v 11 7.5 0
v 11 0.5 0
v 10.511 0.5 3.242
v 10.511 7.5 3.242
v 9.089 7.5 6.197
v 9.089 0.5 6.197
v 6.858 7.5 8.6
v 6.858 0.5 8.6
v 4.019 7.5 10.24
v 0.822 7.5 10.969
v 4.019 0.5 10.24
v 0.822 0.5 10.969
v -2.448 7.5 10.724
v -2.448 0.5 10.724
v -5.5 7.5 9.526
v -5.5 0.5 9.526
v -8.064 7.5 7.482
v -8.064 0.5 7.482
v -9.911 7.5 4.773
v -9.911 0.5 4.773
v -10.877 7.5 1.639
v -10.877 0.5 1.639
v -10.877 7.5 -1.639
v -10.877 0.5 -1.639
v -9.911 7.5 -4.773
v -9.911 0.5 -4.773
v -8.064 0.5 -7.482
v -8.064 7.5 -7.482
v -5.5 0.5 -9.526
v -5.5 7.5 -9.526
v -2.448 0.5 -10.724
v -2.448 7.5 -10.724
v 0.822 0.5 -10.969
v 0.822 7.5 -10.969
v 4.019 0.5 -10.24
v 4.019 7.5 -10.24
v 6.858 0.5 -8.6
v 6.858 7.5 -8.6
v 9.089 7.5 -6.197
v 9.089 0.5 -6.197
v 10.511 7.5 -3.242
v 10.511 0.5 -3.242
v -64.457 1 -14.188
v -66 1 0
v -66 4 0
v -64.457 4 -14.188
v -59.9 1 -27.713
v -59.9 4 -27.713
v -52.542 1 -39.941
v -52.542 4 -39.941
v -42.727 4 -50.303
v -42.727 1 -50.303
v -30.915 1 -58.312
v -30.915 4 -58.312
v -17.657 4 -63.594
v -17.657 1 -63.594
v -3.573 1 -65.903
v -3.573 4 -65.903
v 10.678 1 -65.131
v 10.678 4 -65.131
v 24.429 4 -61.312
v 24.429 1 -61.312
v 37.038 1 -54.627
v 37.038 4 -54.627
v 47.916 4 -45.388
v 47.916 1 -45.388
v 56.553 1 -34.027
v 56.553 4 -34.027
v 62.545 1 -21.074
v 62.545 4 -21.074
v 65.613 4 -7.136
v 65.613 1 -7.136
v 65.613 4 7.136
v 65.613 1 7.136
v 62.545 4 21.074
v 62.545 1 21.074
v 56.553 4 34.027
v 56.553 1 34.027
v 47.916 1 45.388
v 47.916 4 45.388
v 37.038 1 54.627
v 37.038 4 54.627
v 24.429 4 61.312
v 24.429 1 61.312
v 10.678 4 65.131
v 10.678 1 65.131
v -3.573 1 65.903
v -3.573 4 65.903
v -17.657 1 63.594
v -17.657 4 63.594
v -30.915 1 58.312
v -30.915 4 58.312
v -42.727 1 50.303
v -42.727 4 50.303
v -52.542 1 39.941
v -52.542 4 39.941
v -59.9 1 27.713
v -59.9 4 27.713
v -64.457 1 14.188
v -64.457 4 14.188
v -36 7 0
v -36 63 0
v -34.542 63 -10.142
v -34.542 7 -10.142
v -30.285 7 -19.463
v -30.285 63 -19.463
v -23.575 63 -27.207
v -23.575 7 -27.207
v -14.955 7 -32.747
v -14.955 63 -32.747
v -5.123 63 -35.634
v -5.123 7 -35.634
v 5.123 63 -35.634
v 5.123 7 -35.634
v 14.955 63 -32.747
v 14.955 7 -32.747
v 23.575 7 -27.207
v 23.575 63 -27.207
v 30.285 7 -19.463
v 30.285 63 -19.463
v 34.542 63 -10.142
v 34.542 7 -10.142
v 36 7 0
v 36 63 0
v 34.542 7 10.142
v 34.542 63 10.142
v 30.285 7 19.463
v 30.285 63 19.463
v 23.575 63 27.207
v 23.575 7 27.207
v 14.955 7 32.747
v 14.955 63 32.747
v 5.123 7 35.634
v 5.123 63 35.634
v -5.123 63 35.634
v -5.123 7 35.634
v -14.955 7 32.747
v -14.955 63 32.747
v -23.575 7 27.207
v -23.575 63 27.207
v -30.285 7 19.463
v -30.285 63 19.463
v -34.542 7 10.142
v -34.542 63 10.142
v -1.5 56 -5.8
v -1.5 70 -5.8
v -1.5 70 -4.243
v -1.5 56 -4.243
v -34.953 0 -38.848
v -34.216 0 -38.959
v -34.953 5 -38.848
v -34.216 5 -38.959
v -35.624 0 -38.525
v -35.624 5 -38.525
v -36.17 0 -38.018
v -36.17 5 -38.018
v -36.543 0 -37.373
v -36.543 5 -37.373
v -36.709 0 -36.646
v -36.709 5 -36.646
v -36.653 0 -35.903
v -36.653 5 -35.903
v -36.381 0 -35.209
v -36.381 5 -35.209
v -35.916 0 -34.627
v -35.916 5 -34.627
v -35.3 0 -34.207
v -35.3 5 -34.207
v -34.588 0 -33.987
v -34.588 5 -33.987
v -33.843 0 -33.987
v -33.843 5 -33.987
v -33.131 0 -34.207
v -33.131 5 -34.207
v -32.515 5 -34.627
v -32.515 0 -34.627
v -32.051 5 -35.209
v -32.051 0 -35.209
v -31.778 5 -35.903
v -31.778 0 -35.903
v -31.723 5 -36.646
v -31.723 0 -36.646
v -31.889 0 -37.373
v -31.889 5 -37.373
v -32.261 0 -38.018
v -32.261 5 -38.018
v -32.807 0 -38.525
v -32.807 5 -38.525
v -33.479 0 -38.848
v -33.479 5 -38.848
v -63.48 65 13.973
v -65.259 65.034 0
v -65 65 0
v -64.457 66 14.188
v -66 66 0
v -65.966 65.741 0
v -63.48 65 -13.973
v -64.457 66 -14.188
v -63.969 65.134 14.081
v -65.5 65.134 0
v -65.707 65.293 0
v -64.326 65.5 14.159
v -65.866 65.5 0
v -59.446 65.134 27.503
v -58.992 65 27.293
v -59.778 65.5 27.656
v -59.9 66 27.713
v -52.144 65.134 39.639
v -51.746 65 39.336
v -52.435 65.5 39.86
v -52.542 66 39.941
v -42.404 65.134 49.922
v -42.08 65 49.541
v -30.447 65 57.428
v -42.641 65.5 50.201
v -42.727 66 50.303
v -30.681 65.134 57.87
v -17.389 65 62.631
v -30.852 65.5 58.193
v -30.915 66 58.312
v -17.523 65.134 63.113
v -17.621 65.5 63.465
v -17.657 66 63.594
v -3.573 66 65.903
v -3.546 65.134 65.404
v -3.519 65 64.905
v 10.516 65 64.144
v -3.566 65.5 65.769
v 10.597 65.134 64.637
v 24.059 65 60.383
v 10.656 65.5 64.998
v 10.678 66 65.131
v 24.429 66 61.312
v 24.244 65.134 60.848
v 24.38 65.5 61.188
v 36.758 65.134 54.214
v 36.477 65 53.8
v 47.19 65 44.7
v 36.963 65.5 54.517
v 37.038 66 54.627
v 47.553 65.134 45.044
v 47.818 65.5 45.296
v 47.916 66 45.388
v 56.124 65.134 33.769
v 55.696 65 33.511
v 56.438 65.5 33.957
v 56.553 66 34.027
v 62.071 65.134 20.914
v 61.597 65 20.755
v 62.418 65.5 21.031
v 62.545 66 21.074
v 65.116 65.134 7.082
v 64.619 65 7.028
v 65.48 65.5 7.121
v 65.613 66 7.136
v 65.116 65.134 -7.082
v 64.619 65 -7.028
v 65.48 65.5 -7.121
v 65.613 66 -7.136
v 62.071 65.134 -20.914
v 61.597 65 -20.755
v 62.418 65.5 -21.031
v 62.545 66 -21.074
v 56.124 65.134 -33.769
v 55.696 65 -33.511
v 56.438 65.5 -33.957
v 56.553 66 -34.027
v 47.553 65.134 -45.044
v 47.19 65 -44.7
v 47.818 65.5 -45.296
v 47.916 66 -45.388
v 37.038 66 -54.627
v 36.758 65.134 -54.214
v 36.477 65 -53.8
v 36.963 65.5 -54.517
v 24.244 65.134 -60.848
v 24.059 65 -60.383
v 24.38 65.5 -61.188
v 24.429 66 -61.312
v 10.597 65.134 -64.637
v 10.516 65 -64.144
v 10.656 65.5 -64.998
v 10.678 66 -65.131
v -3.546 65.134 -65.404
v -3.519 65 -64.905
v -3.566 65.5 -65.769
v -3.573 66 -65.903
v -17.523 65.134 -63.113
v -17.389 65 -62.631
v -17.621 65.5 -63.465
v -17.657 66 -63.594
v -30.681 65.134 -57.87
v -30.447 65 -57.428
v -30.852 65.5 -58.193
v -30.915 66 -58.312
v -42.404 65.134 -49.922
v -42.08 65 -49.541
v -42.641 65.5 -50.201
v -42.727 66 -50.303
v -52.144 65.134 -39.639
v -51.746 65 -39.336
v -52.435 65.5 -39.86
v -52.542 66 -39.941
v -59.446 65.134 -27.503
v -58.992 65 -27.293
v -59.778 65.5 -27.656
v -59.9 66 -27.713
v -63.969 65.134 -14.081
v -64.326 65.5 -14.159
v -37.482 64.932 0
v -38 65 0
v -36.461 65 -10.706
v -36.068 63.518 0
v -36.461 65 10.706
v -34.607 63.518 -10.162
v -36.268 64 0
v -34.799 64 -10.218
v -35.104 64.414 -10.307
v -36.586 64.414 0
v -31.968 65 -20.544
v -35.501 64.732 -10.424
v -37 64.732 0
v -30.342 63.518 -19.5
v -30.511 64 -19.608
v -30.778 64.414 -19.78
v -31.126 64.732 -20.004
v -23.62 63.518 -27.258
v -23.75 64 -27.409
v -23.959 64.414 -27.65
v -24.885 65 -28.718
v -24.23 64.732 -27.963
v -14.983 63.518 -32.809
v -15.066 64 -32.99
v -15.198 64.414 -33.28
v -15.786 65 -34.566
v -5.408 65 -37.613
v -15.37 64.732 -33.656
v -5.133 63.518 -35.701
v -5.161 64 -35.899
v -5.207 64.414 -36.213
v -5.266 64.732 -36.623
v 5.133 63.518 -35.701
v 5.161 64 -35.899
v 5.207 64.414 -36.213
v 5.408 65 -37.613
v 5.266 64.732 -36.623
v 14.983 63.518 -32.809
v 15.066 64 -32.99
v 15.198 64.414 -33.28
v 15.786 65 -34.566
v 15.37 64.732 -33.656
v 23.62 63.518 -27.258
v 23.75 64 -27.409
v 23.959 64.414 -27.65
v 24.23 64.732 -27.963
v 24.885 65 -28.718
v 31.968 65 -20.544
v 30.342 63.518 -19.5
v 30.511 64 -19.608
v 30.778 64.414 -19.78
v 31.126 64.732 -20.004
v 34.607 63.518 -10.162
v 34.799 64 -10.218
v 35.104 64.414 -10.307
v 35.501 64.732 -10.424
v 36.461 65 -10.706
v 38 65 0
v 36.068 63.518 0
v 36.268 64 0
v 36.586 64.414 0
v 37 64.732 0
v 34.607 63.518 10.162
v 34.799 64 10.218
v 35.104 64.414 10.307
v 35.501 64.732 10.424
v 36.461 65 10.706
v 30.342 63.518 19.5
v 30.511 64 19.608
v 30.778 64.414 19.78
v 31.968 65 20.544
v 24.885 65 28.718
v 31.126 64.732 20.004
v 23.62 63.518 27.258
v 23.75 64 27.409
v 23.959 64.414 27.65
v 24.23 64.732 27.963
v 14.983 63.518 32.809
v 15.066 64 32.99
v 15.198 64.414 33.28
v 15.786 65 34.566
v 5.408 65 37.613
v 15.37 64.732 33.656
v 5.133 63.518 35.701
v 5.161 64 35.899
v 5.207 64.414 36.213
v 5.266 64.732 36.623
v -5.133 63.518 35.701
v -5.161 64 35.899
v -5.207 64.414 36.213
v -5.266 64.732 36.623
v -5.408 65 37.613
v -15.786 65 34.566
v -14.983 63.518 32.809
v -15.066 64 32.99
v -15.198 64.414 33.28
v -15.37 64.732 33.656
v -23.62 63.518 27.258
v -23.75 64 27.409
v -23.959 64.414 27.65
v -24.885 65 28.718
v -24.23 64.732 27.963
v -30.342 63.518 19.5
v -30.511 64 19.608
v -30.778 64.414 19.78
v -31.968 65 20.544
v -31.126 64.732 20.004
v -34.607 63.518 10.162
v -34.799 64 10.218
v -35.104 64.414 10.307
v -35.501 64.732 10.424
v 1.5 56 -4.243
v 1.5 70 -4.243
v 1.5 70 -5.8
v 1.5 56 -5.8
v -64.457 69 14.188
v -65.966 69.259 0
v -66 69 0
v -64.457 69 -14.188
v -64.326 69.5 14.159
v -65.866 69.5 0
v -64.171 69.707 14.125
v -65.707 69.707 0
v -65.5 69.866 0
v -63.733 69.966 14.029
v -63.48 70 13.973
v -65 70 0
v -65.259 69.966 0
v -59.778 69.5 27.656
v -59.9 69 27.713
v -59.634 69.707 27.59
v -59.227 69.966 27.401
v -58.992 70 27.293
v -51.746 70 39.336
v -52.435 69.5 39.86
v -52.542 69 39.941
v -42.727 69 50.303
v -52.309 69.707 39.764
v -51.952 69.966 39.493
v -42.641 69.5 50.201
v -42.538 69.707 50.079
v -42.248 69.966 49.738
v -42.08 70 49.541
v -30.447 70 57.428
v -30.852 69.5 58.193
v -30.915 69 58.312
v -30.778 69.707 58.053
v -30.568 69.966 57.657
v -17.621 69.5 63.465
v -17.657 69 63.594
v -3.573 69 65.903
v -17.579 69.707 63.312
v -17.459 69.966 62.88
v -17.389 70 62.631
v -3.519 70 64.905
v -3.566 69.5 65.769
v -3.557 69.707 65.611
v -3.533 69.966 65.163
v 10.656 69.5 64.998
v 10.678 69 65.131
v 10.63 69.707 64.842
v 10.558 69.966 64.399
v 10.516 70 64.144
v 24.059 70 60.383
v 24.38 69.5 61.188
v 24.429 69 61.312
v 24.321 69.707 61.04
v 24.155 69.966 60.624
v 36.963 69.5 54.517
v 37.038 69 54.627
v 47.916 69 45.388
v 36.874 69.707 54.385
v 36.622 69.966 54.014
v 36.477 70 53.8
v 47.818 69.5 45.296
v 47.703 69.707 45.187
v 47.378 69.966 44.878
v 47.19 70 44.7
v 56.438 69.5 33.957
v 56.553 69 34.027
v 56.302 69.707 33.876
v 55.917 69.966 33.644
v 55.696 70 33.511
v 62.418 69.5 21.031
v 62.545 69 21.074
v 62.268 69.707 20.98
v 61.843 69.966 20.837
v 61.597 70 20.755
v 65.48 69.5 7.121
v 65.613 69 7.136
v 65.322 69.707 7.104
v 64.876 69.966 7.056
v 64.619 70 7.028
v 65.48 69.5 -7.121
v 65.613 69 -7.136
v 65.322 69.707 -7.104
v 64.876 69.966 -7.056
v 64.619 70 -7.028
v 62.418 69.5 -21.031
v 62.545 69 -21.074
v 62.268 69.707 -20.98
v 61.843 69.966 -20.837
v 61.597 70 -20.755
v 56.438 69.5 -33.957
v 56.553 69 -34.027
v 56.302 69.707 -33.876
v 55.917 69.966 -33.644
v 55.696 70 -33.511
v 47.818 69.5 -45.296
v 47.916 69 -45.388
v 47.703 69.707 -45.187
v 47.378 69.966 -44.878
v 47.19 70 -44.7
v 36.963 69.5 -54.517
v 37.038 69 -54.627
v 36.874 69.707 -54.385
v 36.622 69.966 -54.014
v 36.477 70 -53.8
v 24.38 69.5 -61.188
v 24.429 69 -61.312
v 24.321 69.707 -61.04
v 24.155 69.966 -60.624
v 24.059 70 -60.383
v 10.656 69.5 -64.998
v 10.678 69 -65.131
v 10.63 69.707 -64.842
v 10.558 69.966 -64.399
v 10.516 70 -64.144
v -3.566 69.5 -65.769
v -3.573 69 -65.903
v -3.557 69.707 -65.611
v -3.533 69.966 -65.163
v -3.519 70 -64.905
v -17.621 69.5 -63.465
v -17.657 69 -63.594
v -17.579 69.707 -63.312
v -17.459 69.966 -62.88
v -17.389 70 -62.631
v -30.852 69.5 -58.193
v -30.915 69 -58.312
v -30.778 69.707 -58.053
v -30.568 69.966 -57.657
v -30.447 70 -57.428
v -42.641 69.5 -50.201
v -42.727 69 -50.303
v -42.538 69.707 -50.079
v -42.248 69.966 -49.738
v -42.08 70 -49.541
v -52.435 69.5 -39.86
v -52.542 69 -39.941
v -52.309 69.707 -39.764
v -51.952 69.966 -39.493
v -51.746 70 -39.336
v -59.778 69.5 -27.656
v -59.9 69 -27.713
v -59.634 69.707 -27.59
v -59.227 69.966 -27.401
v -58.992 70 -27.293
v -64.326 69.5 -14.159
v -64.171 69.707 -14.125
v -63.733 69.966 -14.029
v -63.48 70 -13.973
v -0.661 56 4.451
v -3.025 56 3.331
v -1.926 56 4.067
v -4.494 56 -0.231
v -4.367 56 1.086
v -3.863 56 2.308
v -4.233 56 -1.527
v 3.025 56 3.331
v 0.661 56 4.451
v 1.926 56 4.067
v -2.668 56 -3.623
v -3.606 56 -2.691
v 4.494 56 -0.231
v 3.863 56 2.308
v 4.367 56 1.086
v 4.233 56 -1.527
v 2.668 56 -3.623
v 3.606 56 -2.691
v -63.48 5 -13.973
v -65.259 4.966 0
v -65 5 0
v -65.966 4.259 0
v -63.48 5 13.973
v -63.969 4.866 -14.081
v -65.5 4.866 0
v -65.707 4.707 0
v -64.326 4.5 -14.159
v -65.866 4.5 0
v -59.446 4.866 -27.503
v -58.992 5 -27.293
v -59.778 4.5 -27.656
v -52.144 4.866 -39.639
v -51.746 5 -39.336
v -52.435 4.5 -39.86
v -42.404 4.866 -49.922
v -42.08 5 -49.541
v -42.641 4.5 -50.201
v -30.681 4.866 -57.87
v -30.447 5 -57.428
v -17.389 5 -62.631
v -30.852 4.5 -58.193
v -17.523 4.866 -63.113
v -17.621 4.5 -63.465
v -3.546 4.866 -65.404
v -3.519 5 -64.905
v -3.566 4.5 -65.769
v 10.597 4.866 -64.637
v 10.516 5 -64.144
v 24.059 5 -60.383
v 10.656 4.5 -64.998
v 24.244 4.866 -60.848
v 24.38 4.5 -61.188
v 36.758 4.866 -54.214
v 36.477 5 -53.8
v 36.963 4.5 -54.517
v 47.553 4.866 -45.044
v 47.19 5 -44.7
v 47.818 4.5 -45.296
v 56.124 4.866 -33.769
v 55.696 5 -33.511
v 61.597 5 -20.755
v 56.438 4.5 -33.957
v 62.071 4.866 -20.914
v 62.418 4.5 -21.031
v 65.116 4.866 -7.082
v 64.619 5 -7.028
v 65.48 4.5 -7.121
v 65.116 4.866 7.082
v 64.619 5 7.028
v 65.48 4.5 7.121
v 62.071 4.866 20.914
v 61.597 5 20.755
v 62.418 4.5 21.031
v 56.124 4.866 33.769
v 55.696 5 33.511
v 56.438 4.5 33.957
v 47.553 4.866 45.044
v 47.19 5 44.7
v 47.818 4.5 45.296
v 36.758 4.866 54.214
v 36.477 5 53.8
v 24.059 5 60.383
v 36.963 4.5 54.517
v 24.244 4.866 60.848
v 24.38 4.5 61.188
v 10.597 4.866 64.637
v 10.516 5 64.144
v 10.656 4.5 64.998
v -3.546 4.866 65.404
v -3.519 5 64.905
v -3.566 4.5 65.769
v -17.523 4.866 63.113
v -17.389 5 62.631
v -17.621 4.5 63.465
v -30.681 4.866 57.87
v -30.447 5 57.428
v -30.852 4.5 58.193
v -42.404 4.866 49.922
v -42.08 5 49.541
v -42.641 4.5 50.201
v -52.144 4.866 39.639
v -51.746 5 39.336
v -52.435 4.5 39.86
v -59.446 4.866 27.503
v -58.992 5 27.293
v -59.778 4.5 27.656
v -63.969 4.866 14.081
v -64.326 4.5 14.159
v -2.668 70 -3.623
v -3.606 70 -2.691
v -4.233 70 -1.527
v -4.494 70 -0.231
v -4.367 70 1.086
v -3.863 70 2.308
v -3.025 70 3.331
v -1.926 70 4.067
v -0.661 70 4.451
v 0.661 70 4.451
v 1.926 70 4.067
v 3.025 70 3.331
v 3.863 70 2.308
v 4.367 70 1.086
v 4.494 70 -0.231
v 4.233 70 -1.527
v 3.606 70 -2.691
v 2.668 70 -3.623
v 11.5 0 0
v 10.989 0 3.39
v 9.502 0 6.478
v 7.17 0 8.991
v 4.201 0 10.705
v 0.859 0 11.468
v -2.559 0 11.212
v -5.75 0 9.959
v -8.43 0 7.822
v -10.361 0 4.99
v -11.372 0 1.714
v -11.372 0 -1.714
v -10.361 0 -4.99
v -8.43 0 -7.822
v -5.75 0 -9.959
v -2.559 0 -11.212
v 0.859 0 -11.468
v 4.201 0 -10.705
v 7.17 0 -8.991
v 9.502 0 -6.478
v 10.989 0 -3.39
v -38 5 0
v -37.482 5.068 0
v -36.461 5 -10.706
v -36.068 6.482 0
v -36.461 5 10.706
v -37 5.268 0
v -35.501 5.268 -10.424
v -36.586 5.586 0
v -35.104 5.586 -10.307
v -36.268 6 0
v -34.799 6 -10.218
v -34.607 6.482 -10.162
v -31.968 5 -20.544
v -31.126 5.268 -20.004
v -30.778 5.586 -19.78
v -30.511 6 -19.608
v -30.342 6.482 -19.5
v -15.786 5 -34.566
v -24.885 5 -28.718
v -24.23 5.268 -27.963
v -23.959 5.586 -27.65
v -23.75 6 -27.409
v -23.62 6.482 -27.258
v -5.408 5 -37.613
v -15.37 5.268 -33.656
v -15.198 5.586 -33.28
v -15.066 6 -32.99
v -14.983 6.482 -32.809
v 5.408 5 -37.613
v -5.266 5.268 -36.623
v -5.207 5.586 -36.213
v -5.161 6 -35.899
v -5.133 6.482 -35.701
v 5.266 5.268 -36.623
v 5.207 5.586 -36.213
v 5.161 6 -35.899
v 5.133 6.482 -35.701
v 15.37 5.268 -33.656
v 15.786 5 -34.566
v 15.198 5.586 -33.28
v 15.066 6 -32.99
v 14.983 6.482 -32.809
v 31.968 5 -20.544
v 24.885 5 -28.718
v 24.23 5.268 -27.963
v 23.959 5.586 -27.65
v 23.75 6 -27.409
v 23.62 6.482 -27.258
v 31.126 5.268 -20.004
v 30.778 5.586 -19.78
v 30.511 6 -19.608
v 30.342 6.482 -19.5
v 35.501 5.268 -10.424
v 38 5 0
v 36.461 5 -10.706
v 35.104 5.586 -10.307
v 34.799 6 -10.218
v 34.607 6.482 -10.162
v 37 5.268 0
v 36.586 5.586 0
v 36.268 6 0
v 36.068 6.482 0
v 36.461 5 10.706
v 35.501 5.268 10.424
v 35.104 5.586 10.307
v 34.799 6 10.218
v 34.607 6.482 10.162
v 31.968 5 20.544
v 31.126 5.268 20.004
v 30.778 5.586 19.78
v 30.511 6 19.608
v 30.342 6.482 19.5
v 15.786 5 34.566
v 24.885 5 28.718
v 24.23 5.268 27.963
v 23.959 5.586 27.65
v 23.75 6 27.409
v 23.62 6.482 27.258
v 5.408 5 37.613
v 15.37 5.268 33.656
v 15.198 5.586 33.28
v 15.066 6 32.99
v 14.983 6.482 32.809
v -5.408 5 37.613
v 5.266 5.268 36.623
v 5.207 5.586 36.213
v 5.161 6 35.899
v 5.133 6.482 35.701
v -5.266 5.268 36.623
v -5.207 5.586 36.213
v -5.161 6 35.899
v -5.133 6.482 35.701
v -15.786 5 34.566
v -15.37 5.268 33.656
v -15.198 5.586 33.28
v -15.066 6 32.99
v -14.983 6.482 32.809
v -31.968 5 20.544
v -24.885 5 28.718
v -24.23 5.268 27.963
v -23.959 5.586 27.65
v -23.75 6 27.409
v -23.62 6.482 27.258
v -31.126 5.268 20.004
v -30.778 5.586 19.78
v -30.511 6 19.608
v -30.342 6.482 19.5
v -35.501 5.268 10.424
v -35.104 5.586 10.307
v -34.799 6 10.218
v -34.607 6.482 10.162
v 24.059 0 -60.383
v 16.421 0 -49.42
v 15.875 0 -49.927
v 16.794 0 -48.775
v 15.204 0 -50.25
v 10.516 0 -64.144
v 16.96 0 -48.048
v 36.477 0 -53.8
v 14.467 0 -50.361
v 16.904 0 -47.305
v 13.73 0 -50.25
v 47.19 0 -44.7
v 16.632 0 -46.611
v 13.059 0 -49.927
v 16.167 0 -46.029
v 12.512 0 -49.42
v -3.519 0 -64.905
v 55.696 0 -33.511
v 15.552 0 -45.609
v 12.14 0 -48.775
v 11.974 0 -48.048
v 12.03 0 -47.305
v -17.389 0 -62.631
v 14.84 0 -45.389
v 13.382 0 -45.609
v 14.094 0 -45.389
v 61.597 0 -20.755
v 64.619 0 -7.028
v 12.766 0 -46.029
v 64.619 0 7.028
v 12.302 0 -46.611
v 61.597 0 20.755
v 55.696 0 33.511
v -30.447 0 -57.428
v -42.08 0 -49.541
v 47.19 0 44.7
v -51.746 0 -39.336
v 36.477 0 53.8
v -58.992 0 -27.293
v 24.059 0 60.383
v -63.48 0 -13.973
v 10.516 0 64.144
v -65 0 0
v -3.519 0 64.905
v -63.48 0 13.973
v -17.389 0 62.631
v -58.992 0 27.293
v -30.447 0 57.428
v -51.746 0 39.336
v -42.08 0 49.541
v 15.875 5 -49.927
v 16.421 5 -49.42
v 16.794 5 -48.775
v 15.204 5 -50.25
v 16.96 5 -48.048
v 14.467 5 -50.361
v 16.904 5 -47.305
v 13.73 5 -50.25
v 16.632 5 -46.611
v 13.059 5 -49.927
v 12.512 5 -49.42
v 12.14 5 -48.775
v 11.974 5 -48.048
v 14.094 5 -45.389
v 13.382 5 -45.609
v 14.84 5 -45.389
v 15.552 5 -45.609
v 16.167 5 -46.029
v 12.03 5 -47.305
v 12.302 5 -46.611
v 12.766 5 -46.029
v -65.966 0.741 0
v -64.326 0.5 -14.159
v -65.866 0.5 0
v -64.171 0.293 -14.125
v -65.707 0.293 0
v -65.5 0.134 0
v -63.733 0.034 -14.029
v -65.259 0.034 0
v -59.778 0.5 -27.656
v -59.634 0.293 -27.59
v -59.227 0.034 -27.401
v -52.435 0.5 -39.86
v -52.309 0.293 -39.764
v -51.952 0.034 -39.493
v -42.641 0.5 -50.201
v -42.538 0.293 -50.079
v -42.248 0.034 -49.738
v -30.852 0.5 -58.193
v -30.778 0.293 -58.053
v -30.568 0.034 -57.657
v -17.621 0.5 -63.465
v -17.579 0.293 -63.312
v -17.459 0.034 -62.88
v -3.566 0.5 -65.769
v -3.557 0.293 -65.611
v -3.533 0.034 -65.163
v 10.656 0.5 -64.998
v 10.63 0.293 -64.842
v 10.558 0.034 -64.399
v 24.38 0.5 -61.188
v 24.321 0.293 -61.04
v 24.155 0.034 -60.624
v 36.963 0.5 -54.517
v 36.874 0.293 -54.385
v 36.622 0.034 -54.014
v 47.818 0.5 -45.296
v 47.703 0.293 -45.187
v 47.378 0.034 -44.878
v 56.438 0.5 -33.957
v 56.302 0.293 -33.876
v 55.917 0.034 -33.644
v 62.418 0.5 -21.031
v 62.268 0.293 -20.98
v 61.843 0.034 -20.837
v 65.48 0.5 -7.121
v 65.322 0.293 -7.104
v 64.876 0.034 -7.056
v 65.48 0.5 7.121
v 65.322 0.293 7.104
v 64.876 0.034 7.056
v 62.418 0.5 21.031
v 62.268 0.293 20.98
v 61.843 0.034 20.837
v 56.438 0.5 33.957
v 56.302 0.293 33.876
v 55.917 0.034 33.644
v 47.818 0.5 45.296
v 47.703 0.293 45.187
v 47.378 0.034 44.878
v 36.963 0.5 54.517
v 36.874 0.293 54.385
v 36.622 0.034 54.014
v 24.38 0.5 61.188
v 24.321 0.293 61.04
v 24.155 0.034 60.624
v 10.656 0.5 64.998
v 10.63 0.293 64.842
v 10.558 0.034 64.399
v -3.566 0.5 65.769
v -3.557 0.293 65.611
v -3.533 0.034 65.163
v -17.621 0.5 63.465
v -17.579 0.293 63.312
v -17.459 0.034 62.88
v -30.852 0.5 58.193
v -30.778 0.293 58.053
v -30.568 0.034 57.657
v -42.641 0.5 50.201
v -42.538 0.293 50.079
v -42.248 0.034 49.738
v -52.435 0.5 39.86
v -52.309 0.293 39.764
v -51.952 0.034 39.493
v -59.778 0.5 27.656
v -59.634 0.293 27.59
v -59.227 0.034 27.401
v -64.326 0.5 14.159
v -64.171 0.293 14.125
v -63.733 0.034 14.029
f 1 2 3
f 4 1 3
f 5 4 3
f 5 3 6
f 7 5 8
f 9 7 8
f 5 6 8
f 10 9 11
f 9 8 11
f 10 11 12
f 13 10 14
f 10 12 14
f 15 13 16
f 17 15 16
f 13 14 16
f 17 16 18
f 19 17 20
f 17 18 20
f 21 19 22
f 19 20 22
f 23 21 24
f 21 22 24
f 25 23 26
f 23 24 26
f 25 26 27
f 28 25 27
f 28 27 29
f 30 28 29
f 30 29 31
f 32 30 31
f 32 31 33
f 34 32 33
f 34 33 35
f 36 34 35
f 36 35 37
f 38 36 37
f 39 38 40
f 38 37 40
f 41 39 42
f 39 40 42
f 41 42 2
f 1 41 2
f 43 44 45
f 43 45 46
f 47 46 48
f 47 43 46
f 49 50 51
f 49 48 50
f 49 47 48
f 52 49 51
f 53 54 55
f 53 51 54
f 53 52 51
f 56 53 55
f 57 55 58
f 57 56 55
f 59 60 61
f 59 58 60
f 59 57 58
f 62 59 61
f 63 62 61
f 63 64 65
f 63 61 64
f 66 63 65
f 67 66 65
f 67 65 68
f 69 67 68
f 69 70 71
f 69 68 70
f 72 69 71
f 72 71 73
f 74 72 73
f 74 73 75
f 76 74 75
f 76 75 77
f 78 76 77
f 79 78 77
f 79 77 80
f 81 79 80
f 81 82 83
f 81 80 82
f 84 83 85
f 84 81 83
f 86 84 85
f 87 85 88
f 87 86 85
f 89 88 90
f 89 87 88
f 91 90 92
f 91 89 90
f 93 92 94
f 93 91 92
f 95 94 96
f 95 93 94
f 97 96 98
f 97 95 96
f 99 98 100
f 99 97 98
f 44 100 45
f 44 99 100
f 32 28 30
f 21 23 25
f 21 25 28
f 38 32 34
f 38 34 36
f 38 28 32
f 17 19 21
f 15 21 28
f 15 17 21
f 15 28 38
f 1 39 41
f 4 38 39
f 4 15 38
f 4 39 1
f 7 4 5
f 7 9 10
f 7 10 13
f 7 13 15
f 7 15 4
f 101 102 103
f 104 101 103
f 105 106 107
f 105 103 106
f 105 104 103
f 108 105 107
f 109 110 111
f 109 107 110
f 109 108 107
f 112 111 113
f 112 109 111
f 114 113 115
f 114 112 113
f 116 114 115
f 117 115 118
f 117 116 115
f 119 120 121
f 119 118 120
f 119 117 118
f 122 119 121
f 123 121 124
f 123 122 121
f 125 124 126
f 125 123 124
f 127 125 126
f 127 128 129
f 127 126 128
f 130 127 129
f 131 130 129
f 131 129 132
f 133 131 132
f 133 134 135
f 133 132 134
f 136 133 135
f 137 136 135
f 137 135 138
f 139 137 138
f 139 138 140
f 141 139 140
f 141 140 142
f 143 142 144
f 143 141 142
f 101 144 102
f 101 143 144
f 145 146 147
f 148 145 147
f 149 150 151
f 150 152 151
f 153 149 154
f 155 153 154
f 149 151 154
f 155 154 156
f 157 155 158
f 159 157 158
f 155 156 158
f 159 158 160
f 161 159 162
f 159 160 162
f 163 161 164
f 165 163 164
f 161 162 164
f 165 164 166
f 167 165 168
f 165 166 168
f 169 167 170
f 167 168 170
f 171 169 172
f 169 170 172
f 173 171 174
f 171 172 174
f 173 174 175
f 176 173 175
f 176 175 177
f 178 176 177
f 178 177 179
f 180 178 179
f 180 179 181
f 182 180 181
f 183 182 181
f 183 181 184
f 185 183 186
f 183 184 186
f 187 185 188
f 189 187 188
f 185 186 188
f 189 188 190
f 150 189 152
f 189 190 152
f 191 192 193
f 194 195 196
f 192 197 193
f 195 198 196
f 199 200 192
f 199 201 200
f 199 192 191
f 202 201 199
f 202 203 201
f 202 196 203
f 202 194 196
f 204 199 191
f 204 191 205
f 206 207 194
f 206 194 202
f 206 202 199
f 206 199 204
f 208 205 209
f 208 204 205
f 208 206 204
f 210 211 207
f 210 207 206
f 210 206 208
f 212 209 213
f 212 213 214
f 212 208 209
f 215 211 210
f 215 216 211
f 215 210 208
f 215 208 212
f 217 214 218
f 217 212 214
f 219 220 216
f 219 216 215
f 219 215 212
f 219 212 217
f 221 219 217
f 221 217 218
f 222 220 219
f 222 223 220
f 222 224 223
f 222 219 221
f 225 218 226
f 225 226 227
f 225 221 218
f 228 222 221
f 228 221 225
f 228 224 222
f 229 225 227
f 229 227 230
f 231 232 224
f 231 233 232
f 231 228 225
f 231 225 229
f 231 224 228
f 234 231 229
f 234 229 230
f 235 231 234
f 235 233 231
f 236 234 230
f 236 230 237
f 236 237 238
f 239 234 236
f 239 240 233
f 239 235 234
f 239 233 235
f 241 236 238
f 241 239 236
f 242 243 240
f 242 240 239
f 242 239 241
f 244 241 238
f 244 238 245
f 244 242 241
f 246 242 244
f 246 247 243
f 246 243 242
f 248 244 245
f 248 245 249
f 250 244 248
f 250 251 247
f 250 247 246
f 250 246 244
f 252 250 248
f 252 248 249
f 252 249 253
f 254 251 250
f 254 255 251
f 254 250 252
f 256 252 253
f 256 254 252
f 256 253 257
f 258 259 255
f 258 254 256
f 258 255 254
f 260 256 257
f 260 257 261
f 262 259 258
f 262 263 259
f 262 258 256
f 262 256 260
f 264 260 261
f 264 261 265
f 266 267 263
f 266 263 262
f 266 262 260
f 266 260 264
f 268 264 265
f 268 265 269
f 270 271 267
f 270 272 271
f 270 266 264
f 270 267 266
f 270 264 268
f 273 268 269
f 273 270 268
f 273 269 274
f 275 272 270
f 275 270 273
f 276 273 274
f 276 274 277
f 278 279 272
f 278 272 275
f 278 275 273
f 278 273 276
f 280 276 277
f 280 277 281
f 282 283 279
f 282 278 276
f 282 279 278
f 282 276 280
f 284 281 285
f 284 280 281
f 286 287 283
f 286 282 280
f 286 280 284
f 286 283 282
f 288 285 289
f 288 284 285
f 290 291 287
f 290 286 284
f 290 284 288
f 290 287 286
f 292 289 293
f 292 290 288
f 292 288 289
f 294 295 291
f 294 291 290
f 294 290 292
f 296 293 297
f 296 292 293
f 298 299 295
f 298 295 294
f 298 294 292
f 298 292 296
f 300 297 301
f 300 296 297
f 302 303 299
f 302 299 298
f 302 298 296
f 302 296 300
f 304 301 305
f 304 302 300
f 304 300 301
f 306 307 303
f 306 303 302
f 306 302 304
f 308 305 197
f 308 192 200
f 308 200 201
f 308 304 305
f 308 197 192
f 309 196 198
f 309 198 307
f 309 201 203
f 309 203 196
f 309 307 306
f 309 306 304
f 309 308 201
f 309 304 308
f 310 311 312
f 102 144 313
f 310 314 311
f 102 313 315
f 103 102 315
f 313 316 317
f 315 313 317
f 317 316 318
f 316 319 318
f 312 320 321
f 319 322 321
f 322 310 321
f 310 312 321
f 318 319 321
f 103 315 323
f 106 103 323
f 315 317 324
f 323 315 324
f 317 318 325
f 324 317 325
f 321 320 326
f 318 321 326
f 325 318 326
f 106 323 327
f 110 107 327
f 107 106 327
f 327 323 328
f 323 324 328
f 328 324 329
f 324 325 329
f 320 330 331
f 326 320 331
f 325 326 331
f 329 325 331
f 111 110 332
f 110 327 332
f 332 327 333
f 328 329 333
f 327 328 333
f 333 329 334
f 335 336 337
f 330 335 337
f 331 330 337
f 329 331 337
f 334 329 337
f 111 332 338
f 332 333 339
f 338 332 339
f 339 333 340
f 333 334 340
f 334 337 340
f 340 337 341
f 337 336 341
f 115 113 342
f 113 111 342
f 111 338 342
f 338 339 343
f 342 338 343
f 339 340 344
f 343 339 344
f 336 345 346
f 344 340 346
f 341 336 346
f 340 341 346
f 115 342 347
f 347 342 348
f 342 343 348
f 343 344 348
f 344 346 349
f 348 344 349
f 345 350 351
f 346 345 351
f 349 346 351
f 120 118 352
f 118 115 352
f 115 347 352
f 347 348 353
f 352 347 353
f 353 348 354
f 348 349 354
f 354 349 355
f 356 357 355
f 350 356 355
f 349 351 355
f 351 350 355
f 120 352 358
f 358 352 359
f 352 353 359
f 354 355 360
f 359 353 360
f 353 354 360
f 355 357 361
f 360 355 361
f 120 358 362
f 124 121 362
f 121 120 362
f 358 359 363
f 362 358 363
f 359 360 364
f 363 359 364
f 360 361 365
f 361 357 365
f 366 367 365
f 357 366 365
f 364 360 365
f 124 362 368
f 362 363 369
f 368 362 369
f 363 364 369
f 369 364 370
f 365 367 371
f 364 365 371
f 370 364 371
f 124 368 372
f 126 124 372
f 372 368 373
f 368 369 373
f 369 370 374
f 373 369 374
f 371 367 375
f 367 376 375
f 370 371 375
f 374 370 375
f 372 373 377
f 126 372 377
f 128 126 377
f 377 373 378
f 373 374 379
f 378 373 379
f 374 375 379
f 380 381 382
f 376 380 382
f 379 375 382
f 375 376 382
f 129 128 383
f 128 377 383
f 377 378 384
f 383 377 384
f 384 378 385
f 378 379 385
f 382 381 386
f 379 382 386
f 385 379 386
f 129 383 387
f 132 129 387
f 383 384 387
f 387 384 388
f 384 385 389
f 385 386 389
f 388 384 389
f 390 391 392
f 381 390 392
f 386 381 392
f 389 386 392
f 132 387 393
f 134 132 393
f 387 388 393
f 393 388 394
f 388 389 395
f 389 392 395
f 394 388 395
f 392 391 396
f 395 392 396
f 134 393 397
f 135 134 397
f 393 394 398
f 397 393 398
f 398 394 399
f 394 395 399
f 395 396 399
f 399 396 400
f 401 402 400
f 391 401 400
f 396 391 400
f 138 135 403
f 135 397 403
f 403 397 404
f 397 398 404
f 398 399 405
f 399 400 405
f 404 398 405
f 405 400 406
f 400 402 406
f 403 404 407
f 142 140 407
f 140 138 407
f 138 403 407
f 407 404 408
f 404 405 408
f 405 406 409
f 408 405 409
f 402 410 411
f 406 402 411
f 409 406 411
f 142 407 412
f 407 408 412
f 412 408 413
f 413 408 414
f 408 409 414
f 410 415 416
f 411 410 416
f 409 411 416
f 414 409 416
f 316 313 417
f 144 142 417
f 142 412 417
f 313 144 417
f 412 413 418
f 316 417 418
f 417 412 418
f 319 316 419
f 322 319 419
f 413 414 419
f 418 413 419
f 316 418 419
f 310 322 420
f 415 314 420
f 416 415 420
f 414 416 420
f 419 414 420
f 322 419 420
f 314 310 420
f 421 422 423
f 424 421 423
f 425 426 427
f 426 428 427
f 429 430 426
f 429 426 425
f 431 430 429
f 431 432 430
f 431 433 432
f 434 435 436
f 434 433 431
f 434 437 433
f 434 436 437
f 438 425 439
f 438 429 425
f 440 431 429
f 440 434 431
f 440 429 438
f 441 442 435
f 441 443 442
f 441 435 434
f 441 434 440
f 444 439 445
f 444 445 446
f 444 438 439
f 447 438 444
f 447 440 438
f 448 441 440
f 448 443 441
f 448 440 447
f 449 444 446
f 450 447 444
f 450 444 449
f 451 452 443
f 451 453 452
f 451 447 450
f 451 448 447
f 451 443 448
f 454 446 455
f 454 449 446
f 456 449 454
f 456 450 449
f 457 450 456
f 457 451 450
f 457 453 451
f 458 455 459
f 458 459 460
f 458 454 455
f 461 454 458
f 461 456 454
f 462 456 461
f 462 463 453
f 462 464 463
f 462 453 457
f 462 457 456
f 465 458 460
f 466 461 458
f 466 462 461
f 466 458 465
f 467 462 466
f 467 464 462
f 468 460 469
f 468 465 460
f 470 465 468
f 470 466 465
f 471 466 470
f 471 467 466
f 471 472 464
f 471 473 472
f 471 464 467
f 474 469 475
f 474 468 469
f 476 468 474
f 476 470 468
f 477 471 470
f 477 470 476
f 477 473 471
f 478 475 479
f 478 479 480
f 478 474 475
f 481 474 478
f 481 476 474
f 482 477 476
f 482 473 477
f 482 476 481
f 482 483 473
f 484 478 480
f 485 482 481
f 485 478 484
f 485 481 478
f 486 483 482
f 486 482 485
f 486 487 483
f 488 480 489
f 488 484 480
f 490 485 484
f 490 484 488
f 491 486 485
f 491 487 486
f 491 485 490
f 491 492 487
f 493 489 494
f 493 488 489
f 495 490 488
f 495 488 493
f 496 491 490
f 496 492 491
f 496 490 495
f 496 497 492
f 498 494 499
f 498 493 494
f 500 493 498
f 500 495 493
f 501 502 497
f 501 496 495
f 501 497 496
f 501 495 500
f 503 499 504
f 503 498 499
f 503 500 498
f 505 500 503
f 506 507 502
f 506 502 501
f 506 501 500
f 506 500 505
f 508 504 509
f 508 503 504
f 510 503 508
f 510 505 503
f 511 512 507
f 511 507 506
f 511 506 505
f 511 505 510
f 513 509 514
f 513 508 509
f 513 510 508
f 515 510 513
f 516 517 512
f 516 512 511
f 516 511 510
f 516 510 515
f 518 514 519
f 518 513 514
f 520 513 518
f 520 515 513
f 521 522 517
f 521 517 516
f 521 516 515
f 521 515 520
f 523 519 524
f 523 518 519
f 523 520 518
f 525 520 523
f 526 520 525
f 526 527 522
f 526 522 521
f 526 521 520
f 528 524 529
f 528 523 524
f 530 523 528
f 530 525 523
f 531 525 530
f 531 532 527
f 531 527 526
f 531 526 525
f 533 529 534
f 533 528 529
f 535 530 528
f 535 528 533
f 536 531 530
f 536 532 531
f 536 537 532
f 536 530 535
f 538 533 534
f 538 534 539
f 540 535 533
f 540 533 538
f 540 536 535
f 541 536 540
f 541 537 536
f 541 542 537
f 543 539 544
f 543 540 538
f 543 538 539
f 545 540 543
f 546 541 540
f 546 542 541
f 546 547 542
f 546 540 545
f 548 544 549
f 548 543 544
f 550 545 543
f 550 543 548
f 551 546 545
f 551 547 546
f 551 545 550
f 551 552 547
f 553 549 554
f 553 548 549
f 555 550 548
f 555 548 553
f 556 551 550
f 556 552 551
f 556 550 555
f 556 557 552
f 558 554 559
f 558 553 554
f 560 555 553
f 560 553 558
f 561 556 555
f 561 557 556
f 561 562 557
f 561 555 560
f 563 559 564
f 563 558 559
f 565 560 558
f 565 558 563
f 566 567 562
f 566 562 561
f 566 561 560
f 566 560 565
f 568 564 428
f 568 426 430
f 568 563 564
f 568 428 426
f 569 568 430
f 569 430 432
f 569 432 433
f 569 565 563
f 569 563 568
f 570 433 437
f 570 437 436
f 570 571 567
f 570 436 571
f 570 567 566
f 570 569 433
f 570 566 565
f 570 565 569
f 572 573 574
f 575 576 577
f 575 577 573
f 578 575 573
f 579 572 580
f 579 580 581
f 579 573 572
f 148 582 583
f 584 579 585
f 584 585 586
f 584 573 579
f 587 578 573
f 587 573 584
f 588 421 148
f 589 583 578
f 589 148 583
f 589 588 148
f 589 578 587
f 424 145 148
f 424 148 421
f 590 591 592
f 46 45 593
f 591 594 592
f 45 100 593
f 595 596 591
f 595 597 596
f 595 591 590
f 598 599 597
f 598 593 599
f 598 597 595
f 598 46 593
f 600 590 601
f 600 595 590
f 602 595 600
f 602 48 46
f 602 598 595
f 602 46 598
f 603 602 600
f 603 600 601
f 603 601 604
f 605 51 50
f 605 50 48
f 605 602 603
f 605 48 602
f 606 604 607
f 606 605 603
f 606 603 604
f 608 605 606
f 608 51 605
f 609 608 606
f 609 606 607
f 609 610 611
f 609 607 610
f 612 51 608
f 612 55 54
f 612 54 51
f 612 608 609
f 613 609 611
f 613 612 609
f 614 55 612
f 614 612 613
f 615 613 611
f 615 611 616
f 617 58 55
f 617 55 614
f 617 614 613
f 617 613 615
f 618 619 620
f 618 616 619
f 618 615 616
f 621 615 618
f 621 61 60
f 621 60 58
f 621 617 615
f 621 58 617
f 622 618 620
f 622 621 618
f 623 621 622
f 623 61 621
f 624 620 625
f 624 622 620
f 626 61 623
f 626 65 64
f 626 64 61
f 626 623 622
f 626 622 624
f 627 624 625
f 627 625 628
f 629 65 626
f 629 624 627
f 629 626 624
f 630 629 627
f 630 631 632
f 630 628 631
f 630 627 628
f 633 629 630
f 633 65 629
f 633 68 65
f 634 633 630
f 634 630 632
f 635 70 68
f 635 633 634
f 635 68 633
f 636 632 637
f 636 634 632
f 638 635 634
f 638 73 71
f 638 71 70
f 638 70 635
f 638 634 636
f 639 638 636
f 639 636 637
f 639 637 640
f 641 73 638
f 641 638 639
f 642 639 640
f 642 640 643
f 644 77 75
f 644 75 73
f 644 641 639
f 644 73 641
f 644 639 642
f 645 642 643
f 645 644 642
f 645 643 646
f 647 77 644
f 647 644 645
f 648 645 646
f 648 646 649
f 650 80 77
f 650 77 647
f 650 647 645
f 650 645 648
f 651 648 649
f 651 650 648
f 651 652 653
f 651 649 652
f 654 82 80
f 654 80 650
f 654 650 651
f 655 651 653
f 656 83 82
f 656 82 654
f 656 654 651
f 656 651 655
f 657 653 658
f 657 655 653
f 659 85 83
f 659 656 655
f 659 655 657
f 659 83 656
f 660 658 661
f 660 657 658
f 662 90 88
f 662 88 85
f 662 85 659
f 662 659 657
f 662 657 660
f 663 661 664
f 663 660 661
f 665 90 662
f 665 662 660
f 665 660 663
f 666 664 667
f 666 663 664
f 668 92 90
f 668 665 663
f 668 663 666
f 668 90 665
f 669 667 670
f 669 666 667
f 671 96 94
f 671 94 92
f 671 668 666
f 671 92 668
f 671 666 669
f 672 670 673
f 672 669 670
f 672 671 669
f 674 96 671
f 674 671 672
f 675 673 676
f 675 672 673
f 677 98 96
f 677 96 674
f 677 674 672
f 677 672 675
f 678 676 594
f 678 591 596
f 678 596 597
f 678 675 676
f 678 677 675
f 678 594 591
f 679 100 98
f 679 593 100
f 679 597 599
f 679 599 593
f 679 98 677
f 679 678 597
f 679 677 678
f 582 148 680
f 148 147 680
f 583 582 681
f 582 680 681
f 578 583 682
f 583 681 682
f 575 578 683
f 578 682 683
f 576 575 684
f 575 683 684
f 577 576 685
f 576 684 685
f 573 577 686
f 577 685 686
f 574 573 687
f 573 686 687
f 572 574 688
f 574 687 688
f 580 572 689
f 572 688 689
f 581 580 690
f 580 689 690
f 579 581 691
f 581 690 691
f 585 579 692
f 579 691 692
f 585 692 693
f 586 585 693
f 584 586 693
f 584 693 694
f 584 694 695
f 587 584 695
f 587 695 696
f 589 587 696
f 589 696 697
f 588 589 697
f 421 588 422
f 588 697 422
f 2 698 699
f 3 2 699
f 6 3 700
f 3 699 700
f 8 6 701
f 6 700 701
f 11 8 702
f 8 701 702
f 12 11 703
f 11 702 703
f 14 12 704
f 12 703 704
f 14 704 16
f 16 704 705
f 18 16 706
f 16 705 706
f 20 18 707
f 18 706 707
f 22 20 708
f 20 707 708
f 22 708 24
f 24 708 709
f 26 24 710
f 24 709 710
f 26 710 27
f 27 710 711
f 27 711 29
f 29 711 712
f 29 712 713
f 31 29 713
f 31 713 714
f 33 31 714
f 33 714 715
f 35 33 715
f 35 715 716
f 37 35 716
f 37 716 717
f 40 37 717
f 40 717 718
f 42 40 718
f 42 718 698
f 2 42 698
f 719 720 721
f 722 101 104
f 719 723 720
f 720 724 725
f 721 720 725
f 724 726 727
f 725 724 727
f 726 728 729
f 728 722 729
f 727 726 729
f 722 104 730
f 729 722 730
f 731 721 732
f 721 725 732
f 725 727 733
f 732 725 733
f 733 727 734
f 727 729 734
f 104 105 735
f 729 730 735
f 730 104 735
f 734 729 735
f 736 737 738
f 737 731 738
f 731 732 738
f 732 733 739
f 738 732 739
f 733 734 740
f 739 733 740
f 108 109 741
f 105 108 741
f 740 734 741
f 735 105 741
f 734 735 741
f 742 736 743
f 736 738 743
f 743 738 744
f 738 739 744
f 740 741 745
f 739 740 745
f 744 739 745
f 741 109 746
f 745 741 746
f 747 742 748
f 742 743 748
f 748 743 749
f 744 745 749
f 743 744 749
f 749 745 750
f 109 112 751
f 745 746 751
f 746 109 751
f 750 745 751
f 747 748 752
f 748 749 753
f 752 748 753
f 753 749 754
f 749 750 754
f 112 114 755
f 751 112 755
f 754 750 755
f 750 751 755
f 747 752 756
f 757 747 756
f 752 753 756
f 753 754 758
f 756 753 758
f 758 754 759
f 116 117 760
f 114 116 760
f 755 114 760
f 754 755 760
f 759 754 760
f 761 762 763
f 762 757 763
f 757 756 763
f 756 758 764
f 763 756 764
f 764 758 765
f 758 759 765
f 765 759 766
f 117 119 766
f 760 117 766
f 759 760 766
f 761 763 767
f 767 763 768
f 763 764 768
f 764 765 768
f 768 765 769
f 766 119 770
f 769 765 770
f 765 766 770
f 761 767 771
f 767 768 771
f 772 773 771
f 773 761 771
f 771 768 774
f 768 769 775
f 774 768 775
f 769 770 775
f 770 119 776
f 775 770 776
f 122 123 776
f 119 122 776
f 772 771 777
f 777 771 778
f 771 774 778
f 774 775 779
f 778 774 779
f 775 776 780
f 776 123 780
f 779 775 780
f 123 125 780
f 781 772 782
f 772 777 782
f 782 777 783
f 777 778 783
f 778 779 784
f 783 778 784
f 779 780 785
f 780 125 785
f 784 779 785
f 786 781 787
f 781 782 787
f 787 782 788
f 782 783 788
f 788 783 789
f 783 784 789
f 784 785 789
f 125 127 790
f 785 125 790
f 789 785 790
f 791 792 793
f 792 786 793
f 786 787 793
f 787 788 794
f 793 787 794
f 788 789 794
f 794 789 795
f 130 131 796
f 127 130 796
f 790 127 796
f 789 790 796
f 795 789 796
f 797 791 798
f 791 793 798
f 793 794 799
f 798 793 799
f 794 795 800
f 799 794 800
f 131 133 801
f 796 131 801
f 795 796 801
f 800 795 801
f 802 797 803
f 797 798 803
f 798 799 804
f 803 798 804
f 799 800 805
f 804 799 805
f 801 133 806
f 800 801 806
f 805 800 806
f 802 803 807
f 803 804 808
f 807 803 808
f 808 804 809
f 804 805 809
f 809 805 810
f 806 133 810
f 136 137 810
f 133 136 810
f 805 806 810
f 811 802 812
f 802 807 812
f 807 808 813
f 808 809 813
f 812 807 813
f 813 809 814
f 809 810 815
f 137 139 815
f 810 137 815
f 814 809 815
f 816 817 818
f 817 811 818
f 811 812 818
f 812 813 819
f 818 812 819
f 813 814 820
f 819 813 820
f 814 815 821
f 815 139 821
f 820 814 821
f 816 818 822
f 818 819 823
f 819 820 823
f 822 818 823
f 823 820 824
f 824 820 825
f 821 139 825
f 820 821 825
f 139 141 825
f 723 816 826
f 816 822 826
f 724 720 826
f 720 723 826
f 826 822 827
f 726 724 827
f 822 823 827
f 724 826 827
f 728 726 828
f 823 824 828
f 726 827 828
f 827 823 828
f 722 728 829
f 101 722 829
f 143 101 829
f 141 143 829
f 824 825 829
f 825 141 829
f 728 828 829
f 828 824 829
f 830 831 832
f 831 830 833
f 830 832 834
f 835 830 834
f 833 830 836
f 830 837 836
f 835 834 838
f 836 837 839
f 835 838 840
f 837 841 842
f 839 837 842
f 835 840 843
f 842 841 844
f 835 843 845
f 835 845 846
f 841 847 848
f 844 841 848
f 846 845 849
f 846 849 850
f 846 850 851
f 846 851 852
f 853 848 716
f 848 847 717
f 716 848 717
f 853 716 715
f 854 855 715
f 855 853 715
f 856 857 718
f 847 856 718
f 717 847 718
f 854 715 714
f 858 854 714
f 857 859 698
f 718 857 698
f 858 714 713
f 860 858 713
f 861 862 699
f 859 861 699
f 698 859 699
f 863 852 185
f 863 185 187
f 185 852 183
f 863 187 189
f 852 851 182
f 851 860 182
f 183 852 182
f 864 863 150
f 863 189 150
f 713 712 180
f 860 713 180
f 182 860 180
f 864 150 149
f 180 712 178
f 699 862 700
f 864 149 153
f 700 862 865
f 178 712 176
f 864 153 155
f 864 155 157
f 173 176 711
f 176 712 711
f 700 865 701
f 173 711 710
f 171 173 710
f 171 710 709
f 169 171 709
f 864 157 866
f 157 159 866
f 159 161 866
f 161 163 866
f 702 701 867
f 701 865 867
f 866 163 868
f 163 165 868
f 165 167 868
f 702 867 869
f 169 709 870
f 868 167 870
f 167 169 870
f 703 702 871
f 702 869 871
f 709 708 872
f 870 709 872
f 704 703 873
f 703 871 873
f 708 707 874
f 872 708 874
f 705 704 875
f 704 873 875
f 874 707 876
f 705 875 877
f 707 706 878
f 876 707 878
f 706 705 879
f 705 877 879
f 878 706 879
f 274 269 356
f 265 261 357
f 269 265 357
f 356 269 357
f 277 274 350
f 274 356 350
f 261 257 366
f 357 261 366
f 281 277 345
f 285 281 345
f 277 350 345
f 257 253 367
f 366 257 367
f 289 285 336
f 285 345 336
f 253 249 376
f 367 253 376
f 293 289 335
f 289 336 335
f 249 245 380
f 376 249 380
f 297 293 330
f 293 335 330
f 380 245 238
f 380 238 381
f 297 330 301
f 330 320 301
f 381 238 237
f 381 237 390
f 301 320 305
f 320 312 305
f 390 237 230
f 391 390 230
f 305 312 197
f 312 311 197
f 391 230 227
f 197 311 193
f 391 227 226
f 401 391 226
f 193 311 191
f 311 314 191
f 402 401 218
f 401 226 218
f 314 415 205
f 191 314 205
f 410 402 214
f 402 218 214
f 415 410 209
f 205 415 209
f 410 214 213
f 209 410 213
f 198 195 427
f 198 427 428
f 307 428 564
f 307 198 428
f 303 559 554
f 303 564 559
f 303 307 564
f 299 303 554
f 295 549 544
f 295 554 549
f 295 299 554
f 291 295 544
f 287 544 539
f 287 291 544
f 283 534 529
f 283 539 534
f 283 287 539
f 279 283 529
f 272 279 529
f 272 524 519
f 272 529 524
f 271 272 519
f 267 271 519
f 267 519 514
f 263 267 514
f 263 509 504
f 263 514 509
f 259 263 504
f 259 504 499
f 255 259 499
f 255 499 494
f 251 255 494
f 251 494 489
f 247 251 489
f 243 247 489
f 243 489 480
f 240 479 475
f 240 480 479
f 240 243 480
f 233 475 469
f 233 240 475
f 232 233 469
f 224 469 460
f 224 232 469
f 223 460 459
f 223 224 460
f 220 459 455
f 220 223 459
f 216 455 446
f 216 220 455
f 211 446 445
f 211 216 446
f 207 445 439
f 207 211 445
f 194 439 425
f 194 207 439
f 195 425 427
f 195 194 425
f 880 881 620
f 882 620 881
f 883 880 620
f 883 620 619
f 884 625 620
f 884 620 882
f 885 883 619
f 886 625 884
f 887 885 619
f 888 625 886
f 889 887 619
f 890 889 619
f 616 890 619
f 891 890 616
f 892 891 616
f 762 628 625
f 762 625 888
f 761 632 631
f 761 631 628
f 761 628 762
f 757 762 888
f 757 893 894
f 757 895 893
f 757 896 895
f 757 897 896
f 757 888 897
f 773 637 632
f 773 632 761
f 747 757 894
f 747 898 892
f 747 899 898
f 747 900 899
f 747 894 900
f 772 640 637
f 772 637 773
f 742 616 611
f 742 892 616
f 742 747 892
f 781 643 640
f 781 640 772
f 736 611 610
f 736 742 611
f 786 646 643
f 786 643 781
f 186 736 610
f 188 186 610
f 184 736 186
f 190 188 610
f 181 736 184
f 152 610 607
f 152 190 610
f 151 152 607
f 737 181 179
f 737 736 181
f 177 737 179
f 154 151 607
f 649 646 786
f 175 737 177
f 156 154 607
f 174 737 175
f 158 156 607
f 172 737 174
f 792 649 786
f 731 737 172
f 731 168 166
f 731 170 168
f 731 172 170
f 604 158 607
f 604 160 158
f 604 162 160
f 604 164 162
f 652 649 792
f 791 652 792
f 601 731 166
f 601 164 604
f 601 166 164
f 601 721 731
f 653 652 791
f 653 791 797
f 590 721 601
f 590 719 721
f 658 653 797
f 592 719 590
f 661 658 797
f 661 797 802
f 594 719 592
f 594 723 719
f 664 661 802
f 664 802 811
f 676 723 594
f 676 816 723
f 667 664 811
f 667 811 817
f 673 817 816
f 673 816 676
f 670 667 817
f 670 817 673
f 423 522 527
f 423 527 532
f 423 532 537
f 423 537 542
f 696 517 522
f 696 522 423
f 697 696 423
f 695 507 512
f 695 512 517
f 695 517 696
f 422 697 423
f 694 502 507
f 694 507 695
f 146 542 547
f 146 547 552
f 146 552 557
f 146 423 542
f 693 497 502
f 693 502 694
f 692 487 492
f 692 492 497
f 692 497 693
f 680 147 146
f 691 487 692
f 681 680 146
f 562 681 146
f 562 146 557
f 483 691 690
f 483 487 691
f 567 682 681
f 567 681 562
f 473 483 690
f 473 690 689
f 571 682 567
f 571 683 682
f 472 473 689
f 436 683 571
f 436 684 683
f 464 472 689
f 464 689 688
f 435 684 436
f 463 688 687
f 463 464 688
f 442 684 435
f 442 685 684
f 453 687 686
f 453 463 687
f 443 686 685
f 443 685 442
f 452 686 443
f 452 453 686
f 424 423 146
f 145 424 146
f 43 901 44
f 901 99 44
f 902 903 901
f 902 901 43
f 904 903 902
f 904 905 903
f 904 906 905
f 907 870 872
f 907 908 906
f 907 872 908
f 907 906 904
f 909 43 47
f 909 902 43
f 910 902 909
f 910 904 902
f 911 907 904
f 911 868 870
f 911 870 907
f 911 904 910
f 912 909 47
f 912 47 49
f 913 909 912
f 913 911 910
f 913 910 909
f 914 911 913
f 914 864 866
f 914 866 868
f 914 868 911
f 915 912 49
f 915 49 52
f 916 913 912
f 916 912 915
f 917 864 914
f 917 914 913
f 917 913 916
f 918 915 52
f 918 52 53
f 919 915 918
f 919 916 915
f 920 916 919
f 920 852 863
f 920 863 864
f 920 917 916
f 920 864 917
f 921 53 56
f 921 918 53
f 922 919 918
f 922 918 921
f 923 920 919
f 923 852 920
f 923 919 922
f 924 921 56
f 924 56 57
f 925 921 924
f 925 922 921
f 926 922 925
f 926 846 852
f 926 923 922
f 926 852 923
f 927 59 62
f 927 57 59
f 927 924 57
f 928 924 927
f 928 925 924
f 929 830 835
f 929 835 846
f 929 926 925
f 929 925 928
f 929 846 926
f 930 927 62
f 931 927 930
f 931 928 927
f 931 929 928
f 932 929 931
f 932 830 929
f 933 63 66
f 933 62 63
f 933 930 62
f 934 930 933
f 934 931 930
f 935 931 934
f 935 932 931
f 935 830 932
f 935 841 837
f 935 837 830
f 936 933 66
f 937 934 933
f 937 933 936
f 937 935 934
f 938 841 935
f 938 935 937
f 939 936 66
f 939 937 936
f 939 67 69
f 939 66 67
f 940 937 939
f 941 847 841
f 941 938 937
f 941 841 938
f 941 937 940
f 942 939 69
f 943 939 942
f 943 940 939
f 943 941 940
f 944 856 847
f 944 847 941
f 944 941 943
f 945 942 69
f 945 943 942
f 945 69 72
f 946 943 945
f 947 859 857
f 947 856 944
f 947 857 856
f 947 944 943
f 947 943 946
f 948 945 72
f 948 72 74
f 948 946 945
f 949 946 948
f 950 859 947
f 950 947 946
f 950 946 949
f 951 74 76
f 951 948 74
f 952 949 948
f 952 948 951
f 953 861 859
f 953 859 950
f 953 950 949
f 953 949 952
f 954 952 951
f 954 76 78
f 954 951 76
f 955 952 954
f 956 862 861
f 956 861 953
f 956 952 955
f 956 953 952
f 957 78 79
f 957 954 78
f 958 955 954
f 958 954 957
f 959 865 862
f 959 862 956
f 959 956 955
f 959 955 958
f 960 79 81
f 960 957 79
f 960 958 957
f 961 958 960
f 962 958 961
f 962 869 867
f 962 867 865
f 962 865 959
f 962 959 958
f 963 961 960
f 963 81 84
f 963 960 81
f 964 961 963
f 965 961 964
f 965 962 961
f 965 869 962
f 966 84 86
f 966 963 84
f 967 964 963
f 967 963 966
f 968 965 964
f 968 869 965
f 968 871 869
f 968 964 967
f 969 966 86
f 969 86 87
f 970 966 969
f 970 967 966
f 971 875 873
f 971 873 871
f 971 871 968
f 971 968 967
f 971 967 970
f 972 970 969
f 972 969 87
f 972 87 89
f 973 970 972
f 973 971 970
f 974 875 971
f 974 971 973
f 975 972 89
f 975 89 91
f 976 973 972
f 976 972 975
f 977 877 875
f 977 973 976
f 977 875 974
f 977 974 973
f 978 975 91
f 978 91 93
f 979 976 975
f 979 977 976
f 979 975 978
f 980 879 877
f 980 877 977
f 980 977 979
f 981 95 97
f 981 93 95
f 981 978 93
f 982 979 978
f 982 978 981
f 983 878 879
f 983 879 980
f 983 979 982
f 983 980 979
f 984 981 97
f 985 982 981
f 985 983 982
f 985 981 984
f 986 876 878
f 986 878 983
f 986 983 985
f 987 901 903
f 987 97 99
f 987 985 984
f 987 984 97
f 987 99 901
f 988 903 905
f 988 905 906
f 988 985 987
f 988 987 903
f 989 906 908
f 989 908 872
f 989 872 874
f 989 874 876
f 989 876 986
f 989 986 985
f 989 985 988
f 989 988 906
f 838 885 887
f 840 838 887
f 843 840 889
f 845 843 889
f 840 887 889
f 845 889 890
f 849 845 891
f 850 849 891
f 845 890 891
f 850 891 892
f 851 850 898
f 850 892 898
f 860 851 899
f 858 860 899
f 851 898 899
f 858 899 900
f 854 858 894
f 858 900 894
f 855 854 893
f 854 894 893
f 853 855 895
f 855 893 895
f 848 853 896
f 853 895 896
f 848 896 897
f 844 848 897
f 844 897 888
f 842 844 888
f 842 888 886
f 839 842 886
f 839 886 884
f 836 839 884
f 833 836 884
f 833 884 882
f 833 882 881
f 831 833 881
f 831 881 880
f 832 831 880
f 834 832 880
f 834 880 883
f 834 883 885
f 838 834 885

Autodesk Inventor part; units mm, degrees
ref_plane "YZ Plane" through (0, 0, 0) normal (1, 0, 0) x (0, 1, 0)
ref_plane "XZ Plane" through (0, 0, 0) normal (0, 1, 0) x (-1, 0, 0)
sketch "Sketch1" plane through (0, 0, 0) normal (0, 0, 1) x (1, 0, 0)
  line L0 (0, 70) -> (-66, 70)
  line L1 (-66, 70) -> (-66, 65)
  line L2 (-66, 65) -> (-36, 65)
  line L3 (-36, 65) -> (-36, 5)
  line L4 (-36, 5) -> (-66, 5)
  line L5 (-66, 5) -> (-66, 0)
  line L6 (-66, 0) -> (0, 0)
  line L7 (0, 0) -> (0, 70)
  dimension "d0" = 5
  dimension "d1" = 5
  dimension "d2" = 66
  dimension "d3" = 36
  dimension "d4" = 60
revolve "Revolution1" add sketch "Sketch1" angle 360 about axis through (0, 0, 0) along (0, 1, 0)
fillet "Fillet1" radius 2 2 edges at (36, 5, 0) (36, 65, 0)
fillet "Fillet2" radius 1 4 edges at (66, 70, 0) (66, 65, 0) (66, 5, 0) (66, 0, 0)
sketch "Sketch2" plane through (0, 70, 0) normal (0, 1, 0) x (1, 0, 0)
  circle A0 centre (0, 0) radius 4.5
  line L0 (-1.5, 4.2426) -> (1.5, 4.2426)
  line L1 (1.5, 4.2426) -> (1.5, 5.8)
  line L2 (1.5, 5.8) -> (-1.5, 5.8)
  line L3 (-1.5, 5.8) -> (-1.5, 4.2426)
  dimension "d8" = 9
  dimension "d9" = 5.8
  dimension "d10" = 3
extrude "Extrusion1" cut sketch "Sketch2" against normal blind 14
sketch "Sketch3" plane through (0, 0, 0) normal (0, -1, 0) x (1, 0, 0)
  point P0 (0, 0)
  point P1 (14.4669, -47.8614)
  point P2 (-34.2157, -36.4594)
  dimension "d13" = 50
  dimension "d14" = 50
  dimension "d15" = 50
hole "Hole1" at (14.4669, 0, -47.8614) at (-34.2157, 0, -36.4594) direction (0, 1, 0) diameter 5 depth 8
ref_plane "midPlane" through (0, 35, 0) normal (0, 1, 0) x (1, 0, 0)
sketch "Sketch4" plane through (0, 0, 0) normal (0, -1, 0) x (1, 0, 0)
  circle A0 centre (0, 0) radius 11
  point P0 (0, 0)
  dimension "d23" = 22
extrude "Extrusion2" cut sketch "Sketch4" against normal blind 7.5
chamfer "Chamfer1" distance 0.5 angle 45 1 edges at (-11, 0, 0)
equation "\"d1\" = d0"
equation "\"d14\" = d13"
properties part number "reel" material "Steel, Mild"
